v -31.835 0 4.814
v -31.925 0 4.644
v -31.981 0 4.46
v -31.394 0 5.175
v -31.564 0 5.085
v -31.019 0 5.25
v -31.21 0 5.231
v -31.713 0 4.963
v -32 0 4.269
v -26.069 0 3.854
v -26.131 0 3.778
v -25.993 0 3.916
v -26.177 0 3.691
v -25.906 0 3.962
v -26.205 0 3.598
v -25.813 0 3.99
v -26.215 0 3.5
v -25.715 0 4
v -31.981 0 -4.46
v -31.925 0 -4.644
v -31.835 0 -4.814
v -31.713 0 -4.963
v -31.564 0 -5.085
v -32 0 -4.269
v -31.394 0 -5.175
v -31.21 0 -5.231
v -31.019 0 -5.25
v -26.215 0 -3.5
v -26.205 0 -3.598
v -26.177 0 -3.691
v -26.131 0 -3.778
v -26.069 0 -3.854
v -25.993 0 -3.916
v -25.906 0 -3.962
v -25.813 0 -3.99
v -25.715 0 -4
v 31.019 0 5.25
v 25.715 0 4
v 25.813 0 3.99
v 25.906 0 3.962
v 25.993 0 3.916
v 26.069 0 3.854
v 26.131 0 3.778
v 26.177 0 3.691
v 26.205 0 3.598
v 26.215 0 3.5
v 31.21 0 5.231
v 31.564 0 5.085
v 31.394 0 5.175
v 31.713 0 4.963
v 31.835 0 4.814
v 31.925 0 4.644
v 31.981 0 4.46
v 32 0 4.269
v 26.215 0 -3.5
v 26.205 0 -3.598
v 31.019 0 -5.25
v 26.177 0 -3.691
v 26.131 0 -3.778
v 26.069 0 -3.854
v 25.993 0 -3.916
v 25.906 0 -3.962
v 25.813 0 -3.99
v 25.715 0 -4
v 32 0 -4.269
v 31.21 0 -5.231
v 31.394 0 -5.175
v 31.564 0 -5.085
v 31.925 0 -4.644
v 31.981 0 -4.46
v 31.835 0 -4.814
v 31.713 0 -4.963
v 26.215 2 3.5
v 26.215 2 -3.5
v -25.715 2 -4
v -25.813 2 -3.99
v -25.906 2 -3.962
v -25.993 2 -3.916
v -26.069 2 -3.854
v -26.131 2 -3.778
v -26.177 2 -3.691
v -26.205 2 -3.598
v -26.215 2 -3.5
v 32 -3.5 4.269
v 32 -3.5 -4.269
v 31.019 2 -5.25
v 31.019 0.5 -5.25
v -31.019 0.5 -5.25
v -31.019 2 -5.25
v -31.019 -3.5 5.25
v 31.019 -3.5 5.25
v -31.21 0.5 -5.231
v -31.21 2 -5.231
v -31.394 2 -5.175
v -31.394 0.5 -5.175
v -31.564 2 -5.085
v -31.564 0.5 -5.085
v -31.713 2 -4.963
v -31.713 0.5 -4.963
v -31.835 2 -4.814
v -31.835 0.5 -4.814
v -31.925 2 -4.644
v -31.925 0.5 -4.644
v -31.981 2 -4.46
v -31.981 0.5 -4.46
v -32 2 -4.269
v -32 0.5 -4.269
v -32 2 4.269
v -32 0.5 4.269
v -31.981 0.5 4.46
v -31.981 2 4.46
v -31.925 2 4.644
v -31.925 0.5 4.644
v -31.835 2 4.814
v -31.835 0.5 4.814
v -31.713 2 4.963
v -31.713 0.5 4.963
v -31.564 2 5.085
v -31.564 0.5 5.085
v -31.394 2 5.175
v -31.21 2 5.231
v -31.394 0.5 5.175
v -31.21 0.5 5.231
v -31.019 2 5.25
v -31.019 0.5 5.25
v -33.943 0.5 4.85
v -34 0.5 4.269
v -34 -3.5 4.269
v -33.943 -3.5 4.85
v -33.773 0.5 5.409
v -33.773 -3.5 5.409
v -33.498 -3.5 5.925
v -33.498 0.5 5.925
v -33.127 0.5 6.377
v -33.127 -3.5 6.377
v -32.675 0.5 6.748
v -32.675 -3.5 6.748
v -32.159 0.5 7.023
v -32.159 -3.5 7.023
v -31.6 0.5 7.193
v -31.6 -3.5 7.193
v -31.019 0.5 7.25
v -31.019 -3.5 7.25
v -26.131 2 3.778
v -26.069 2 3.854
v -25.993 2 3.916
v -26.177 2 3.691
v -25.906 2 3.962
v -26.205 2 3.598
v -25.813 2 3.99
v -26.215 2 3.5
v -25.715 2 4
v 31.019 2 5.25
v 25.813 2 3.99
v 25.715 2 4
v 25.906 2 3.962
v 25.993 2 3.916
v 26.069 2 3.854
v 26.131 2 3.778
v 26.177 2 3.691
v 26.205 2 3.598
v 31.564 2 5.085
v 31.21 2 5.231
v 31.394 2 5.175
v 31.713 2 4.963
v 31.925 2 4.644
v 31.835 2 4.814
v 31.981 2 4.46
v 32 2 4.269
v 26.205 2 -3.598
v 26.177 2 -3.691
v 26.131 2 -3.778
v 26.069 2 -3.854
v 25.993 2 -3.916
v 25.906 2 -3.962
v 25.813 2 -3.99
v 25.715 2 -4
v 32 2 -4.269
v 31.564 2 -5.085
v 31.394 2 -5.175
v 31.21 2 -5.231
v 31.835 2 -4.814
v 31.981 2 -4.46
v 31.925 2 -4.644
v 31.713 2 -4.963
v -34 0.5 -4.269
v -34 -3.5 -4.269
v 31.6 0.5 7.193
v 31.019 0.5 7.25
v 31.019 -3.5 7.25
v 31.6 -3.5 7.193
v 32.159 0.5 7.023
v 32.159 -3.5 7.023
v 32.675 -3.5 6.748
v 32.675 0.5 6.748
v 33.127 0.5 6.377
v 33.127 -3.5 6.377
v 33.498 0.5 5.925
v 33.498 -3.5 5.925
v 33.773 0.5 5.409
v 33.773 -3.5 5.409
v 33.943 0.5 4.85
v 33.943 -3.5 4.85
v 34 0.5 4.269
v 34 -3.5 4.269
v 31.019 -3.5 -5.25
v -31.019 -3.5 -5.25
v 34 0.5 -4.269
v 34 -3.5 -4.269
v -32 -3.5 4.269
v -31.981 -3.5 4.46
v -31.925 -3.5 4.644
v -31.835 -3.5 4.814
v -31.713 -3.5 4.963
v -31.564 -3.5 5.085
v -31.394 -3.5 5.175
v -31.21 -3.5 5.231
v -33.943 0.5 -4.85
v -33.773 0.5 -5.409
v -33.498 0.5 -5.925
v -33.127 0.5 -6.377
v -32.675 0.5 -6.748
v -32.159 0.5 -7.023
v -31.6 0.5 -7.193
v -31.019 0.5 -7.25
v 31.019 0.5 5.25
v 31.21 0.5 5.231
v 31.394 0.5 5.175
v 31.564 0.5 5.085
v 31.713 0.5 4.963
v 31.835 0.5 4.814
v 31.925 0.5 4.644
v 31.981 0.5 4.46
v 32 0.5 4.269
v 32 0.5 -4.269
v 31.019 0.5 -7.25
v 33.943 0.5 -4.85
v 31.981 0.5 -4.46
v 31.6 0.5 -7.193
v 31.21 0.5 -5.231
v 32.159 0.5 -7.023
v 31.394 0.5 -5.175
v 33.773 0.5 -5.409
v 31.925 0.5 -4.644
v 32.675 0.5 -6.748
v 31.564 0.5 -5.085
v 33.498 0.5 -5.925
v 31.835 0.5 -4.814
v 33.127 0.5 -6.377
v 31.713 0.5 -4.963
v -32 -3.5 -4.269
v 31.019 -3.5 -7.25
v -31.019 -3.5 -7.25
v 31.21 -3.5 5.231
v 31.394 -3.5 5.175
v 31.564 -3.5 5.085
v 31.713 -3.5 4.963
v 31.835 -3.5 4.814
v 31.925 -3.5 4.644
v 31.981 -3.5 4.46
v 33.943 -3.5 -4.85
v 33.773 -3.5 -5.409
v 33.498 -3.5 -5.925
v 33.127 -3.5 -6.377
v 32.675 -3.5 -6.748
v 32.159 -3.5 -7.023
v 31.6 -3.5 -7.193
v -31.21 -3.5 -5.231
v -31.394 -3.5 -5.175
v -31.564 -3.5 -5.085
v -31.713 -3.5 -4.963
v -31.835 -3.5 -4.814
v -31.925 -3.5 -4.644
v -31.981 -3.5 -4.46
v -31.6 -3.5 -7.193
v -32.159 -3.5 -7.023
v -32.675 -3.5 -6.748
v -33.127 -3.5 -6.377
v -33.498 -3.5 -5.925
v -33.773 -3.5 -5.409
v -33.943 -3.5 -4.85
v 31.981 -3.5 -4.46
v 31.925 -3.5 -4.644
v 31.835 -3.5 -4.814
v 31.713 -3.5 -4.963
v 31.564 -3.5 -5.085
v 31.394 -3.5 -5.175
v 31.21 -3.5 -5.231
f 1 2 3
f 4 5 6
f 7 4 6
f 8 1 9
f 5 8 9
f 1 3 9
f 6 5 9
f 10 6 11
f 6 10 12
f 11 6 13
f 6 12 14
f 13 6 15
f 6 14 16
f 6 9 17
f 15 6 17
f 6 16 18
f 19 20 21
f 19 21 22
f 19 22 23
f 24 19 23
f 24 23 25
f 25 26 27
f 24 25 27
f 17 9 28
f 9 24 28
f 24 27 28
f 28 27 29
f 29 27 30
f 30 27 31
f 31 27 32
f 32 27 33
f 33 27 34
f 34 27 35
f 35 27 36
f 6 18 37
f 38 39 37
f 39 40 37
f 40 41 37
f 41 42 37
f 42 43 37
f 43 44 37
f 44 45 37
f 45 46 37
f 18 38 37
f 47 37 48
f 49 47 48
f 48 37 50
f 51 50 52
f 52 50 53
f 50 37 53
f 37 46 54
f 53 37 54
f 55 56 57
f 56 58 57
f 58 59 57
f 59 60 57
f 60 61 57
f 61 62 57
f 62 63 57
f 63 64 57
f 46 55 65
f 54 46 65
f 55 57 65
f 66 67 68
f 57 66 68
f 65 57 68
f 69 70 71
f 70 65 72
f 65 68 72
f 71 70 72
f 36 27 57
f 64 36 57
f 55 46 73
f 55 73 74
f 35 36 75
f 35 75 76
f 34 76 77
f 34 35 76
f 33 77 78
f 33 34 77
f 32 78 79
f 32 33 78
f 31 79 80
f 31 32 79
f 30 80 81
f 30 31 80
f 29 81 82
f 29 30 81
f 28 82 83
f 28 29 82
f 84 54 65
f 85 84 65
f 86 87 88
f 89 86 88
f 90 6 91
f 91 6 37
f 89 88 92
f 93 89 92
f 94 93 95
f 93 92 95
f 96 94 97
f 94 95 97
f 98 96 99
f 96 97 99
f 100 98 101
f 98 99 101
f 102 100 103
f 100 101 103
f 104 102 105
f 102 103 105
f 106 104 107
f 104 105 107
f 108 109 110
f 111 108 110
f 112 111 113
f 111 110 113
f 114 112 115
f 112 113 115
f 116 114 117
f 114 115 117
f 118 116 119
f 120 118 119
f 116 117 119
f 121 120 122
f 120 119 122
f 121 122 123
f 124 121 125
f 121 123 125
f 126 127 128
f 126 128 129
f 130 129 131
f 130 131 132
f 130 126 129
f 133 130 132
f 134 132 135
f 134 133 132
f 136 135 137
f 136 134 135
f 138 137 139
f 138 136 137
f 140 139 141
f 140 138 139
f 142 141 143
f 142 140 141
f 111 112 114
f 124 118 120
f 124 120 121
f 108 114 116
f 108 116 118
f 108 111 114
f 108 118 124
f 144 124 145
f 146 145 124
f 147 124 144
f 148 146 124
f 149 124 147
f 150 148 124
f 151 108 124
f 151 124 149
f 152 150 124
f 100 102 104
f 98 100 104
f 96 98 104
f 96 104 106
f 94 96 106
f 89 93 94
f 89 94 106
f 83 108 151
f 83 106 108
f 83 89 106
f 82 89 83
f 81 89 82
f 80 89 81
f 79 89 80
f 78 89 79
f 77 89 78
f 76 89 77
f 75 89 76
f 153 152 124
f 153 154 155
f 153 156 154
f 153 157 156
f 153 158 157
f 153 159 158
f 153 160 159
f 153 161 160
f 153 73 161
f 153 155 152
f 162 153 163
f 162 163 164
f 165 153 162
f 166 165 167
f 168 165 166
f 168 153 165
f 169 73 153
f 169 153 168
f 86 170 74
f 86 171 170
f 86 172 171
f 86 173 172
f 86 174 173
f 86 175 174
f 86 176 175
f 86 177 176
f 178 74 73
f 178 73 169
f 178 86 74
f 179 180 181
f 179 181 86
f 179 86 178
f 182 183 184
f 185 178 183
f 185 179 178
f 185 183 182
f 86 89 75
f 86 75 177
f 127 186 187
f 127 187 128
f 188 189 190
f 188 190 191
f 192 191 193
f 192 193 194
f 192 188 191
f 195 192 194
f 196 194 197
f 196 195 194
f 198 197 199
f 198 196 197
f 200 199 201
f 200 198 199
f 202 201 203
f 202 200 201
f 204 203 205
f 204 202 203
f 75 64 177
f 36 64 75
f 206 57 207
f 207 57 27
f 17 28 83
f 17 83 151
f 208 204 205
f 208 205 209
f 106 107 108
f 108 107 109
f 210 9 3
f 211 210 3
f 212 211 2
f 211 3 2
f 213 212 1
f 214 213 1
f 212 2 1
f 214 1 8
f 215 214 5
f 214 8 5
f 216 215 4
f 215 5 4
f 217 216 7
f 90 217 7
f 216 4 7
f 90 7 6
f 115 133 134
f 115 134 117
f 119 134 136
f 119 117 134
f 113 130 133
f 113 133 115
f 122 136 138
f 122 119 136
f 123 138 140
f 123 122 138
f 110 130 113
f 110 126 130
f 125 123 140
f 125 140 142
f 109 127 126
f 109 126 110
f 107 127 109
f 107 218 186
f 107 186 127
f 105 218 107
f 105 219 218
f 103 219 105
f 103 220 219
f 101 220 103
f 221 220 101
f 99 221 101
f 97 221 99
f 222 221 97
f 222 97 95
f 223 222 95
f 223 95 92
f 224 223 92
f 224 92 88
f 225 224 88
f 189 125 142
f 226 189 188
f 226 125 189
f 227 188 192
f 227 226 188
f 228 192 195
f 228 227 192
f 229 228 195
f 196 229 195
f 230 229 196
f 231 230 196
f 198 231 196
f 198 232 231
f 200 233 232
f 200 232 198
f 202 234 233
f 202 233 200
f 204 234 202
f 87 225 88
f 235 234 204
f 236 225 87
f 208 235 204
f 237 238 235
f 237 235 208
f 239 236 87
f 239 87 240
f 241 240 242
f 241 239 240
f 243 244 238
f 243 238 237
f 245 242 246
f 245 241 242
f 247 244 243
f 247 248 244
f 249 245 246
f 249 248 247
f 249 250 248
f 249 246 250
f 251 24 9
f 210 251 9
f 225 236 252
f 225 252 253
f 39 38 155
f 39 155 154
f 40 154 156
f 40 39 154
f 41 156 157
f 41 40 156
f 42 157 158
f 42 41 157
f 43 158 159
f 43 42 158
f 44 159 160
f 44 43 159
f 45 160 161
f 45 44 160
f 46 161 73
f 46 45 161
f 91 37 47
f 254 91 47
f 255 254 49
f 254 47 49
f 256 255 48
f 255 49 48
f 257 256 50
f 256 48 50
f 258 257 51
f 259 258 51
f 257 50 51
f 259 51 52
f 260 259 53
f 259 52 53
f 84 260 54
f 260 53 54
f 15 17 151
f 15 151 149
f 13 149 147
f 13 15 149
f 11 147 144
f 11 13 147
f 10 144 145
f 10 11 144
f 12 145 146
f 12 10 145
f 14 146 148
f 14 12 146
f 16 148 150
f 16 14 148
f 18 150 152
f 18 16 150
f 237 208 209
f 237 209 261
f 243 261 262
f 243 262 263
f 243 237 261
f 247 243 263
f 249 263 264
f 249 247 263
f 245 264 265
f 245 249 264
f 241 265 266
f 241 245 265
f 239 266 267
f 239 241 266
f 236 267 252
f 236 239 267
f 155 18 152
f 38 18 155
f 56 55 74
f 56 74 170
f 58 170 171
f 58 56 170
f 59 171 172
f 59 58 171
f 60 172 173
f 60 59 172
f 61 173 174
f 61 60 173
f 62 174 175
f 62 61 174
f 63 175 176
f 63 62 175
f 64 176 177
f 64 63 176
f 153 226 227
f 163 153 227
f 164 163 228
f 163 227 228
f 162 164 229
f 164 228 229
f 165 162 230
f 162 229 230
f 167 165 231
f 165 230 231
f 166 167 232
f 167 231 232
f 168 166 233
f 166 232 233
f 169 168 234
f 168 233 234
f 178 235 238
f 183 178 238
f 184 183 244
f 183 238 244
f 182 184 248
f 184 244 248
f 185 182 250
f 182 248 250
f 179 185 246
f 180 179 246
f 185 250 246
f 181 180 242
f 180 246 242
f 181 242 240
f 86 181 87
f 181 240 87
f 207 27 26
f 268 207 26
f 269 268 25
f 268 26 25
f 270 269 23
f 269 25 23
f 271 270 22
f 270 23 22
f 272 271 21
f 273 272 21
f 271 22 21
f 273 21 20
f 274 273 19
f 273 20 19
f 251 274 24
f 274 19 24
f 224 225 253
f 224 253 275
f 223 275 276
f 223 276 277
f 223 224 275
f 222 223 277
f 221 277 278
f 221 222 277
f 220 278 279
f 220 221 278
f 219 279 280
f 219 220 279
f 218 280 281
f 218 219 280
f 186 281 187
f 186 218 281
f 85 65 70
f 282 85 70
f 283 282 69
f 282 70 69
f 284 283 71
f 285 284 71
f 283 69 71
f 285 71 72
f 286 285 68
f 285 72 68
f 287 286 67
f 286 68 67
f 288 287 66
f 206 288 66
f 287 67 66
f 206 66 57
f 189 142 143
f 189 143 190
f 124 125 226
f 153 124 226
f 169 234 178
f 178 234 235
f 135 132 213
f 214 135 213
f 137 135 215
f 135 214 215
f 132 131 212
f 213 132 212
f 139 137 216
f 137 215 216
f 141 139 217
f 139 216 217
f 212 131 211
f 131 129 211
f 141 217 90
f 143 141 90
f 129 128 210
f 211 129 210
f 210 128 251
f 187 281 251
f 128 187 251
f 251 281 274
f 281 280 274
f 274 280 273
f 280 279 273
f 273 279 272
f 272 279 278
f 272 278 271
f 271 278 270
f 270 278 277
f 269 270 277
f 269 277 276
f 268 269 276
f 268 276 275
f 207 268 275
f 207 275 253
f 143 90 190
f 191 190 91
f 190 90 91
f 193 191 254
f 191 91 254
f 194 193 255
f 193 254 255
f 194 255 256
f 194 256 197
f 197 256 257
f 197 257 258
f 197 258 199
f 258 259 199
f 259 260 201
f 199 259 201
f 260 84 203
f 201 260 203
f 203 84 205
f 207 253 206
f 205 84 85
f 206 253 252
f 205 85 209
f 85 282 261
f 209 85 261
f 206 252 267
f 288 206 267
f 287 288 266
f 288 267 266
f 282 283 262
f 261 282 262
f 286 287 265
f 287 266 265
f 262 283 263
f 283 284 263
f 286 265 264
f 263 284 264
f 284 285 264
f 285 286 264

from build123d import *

# Parameters (mm, degrees)
BOSS_EXTRUDE1_DEPTH = 2
BOSS_EXTRUDE2_START = 0.5
BOSS_EXTRUDE2_DEPTH = 4


with BuildPart() as part:
    # Sketch1 → Boss-Extrude1 (new body)
    with BuildSketch(Plane(origin=(0, 0, 0), x_dir=(1, 0, 0), z_dir=(0, 1, 0))):
        with BuildLine():
            Line((-31.018542474, -5.25), (31.018542474, -5.25))
            ThreePointArc((31.018542474, -5.25), (31.712537746, -4.962537746), (32, -4.268542474))
            Line((32, -4.268542474), (32, 4.268542474))
            ThreePointArc((32, 4.268542474), (31.712537746, 4.962537746), (31.018542474, 5.25))
            Line((31.018542474, 5.25), (-31.018542474, 5.25))
            ThreePointArc((-31.018542474, 5.25), (-31.712537746, 4.962537746), (-32, 4.268542474))
            Line((-32, 4.268542474), (-32, -4.268542474))
            ThreePointArc((-32, -4.268542474), (-31.712537746, -4.962537746), (-31.018542474, -5.25))
        make_face()
        with BuildLine():
            Line((-26.215, 3.50000032), (-26.215, -3.50000032))
            ThreePointArc((-26.215, -3.50000032), (-26.068553391, -3.853553711), (-25.715, -4.00000032))
            Line((-25.715, -4.00000032), (25.715, -4.00000032))
            ThreePointArc((25.715, -4.00000032), (26.068553391, -3.853553711), (26.215, -3.50000032))
            Line((26.215, -3.50000032), (26.215, 3.50000032))
            ThreePointArc((26.215, 3.50000032), (26.068553391, 3.853553711), (25.715, 4.00000032))
            Line((25.715, 4.00000032), (-25.715, 4.00000032))
            ThreePointArc((-25.715, 4.00000032), (-26.068553391, 3.853553711), (-26.215, 3.50000032))
        make_face(mode=Mode.SUBTRACT)
    extrude(amount=BOSS_EXTRUDE1_DEPTH)

    # Sketch2 → Boss-Extrude2 (add)
    with BuildSketch(Plane(origin=(0, 0, 0), x_dir=(1, 0, 0), z_dir=(0, 1, 0)).offset(BOSS_EXTRUDE2_START)):
        with BuildLine():
            Line((-31.018542474, -7.25), (31.018542474, -7.25))
            ThreePointArc((31.018542474, -7.25), (33.126751308, -6.376751308), (34, -4.268542474))
            Line((34, -4.268542474), (34, 4.268542474))
            ThreePointArc((34, 4.268542474), (33.126751308, 6.376751308), (31.018542474, 7.25))
            Line((31.018542474, 7.25), (-31.018542474, 7.25))
            ThreePointArc((-31.018542474, 7.25), (-33.126751308, 6.376751308), (-34, 4.268542474))
            Line((-34, 4.268542474), (-34, -4.268542474))
            ThreePointArc((-34, -4.268542474), (-33.126751308, -6.376751308), (-31.018542474, -7.25))
        make_face()
        with BuildLine():
            Line((-31.018542474, -5.25), (31.018542474, -5.25))
            ThreePointArc((31.018542474, -5.25), (31.712537746, -4.962537746), (32, -4.268542474))
            Line((32, -4.268542474), (32, 4.268542474))
            ThreePointArc((32, 4.268542474), (31.712537746, 4.962537746), (31.018542474, 5.25))
            Line((31.018542474, 5.25), (-31.018542474, 5.25))
            ThreePointArc((-31.018542474, 5.25), (-31.712537746, 4.962537746), (-32, 4.268542474))
            Line((-32, 4.268542474), (-32, -4.268542474))
            ThreePointArc((-32, -4.268542474), (-31.712537746, -4.962537746), (-31.018542474, -5.25))
        make_face(mode=Mode.SUBTRACT)
    extrude(amount=-BOSS_EXTRUDE2_DEPTH)


solid = part.part
